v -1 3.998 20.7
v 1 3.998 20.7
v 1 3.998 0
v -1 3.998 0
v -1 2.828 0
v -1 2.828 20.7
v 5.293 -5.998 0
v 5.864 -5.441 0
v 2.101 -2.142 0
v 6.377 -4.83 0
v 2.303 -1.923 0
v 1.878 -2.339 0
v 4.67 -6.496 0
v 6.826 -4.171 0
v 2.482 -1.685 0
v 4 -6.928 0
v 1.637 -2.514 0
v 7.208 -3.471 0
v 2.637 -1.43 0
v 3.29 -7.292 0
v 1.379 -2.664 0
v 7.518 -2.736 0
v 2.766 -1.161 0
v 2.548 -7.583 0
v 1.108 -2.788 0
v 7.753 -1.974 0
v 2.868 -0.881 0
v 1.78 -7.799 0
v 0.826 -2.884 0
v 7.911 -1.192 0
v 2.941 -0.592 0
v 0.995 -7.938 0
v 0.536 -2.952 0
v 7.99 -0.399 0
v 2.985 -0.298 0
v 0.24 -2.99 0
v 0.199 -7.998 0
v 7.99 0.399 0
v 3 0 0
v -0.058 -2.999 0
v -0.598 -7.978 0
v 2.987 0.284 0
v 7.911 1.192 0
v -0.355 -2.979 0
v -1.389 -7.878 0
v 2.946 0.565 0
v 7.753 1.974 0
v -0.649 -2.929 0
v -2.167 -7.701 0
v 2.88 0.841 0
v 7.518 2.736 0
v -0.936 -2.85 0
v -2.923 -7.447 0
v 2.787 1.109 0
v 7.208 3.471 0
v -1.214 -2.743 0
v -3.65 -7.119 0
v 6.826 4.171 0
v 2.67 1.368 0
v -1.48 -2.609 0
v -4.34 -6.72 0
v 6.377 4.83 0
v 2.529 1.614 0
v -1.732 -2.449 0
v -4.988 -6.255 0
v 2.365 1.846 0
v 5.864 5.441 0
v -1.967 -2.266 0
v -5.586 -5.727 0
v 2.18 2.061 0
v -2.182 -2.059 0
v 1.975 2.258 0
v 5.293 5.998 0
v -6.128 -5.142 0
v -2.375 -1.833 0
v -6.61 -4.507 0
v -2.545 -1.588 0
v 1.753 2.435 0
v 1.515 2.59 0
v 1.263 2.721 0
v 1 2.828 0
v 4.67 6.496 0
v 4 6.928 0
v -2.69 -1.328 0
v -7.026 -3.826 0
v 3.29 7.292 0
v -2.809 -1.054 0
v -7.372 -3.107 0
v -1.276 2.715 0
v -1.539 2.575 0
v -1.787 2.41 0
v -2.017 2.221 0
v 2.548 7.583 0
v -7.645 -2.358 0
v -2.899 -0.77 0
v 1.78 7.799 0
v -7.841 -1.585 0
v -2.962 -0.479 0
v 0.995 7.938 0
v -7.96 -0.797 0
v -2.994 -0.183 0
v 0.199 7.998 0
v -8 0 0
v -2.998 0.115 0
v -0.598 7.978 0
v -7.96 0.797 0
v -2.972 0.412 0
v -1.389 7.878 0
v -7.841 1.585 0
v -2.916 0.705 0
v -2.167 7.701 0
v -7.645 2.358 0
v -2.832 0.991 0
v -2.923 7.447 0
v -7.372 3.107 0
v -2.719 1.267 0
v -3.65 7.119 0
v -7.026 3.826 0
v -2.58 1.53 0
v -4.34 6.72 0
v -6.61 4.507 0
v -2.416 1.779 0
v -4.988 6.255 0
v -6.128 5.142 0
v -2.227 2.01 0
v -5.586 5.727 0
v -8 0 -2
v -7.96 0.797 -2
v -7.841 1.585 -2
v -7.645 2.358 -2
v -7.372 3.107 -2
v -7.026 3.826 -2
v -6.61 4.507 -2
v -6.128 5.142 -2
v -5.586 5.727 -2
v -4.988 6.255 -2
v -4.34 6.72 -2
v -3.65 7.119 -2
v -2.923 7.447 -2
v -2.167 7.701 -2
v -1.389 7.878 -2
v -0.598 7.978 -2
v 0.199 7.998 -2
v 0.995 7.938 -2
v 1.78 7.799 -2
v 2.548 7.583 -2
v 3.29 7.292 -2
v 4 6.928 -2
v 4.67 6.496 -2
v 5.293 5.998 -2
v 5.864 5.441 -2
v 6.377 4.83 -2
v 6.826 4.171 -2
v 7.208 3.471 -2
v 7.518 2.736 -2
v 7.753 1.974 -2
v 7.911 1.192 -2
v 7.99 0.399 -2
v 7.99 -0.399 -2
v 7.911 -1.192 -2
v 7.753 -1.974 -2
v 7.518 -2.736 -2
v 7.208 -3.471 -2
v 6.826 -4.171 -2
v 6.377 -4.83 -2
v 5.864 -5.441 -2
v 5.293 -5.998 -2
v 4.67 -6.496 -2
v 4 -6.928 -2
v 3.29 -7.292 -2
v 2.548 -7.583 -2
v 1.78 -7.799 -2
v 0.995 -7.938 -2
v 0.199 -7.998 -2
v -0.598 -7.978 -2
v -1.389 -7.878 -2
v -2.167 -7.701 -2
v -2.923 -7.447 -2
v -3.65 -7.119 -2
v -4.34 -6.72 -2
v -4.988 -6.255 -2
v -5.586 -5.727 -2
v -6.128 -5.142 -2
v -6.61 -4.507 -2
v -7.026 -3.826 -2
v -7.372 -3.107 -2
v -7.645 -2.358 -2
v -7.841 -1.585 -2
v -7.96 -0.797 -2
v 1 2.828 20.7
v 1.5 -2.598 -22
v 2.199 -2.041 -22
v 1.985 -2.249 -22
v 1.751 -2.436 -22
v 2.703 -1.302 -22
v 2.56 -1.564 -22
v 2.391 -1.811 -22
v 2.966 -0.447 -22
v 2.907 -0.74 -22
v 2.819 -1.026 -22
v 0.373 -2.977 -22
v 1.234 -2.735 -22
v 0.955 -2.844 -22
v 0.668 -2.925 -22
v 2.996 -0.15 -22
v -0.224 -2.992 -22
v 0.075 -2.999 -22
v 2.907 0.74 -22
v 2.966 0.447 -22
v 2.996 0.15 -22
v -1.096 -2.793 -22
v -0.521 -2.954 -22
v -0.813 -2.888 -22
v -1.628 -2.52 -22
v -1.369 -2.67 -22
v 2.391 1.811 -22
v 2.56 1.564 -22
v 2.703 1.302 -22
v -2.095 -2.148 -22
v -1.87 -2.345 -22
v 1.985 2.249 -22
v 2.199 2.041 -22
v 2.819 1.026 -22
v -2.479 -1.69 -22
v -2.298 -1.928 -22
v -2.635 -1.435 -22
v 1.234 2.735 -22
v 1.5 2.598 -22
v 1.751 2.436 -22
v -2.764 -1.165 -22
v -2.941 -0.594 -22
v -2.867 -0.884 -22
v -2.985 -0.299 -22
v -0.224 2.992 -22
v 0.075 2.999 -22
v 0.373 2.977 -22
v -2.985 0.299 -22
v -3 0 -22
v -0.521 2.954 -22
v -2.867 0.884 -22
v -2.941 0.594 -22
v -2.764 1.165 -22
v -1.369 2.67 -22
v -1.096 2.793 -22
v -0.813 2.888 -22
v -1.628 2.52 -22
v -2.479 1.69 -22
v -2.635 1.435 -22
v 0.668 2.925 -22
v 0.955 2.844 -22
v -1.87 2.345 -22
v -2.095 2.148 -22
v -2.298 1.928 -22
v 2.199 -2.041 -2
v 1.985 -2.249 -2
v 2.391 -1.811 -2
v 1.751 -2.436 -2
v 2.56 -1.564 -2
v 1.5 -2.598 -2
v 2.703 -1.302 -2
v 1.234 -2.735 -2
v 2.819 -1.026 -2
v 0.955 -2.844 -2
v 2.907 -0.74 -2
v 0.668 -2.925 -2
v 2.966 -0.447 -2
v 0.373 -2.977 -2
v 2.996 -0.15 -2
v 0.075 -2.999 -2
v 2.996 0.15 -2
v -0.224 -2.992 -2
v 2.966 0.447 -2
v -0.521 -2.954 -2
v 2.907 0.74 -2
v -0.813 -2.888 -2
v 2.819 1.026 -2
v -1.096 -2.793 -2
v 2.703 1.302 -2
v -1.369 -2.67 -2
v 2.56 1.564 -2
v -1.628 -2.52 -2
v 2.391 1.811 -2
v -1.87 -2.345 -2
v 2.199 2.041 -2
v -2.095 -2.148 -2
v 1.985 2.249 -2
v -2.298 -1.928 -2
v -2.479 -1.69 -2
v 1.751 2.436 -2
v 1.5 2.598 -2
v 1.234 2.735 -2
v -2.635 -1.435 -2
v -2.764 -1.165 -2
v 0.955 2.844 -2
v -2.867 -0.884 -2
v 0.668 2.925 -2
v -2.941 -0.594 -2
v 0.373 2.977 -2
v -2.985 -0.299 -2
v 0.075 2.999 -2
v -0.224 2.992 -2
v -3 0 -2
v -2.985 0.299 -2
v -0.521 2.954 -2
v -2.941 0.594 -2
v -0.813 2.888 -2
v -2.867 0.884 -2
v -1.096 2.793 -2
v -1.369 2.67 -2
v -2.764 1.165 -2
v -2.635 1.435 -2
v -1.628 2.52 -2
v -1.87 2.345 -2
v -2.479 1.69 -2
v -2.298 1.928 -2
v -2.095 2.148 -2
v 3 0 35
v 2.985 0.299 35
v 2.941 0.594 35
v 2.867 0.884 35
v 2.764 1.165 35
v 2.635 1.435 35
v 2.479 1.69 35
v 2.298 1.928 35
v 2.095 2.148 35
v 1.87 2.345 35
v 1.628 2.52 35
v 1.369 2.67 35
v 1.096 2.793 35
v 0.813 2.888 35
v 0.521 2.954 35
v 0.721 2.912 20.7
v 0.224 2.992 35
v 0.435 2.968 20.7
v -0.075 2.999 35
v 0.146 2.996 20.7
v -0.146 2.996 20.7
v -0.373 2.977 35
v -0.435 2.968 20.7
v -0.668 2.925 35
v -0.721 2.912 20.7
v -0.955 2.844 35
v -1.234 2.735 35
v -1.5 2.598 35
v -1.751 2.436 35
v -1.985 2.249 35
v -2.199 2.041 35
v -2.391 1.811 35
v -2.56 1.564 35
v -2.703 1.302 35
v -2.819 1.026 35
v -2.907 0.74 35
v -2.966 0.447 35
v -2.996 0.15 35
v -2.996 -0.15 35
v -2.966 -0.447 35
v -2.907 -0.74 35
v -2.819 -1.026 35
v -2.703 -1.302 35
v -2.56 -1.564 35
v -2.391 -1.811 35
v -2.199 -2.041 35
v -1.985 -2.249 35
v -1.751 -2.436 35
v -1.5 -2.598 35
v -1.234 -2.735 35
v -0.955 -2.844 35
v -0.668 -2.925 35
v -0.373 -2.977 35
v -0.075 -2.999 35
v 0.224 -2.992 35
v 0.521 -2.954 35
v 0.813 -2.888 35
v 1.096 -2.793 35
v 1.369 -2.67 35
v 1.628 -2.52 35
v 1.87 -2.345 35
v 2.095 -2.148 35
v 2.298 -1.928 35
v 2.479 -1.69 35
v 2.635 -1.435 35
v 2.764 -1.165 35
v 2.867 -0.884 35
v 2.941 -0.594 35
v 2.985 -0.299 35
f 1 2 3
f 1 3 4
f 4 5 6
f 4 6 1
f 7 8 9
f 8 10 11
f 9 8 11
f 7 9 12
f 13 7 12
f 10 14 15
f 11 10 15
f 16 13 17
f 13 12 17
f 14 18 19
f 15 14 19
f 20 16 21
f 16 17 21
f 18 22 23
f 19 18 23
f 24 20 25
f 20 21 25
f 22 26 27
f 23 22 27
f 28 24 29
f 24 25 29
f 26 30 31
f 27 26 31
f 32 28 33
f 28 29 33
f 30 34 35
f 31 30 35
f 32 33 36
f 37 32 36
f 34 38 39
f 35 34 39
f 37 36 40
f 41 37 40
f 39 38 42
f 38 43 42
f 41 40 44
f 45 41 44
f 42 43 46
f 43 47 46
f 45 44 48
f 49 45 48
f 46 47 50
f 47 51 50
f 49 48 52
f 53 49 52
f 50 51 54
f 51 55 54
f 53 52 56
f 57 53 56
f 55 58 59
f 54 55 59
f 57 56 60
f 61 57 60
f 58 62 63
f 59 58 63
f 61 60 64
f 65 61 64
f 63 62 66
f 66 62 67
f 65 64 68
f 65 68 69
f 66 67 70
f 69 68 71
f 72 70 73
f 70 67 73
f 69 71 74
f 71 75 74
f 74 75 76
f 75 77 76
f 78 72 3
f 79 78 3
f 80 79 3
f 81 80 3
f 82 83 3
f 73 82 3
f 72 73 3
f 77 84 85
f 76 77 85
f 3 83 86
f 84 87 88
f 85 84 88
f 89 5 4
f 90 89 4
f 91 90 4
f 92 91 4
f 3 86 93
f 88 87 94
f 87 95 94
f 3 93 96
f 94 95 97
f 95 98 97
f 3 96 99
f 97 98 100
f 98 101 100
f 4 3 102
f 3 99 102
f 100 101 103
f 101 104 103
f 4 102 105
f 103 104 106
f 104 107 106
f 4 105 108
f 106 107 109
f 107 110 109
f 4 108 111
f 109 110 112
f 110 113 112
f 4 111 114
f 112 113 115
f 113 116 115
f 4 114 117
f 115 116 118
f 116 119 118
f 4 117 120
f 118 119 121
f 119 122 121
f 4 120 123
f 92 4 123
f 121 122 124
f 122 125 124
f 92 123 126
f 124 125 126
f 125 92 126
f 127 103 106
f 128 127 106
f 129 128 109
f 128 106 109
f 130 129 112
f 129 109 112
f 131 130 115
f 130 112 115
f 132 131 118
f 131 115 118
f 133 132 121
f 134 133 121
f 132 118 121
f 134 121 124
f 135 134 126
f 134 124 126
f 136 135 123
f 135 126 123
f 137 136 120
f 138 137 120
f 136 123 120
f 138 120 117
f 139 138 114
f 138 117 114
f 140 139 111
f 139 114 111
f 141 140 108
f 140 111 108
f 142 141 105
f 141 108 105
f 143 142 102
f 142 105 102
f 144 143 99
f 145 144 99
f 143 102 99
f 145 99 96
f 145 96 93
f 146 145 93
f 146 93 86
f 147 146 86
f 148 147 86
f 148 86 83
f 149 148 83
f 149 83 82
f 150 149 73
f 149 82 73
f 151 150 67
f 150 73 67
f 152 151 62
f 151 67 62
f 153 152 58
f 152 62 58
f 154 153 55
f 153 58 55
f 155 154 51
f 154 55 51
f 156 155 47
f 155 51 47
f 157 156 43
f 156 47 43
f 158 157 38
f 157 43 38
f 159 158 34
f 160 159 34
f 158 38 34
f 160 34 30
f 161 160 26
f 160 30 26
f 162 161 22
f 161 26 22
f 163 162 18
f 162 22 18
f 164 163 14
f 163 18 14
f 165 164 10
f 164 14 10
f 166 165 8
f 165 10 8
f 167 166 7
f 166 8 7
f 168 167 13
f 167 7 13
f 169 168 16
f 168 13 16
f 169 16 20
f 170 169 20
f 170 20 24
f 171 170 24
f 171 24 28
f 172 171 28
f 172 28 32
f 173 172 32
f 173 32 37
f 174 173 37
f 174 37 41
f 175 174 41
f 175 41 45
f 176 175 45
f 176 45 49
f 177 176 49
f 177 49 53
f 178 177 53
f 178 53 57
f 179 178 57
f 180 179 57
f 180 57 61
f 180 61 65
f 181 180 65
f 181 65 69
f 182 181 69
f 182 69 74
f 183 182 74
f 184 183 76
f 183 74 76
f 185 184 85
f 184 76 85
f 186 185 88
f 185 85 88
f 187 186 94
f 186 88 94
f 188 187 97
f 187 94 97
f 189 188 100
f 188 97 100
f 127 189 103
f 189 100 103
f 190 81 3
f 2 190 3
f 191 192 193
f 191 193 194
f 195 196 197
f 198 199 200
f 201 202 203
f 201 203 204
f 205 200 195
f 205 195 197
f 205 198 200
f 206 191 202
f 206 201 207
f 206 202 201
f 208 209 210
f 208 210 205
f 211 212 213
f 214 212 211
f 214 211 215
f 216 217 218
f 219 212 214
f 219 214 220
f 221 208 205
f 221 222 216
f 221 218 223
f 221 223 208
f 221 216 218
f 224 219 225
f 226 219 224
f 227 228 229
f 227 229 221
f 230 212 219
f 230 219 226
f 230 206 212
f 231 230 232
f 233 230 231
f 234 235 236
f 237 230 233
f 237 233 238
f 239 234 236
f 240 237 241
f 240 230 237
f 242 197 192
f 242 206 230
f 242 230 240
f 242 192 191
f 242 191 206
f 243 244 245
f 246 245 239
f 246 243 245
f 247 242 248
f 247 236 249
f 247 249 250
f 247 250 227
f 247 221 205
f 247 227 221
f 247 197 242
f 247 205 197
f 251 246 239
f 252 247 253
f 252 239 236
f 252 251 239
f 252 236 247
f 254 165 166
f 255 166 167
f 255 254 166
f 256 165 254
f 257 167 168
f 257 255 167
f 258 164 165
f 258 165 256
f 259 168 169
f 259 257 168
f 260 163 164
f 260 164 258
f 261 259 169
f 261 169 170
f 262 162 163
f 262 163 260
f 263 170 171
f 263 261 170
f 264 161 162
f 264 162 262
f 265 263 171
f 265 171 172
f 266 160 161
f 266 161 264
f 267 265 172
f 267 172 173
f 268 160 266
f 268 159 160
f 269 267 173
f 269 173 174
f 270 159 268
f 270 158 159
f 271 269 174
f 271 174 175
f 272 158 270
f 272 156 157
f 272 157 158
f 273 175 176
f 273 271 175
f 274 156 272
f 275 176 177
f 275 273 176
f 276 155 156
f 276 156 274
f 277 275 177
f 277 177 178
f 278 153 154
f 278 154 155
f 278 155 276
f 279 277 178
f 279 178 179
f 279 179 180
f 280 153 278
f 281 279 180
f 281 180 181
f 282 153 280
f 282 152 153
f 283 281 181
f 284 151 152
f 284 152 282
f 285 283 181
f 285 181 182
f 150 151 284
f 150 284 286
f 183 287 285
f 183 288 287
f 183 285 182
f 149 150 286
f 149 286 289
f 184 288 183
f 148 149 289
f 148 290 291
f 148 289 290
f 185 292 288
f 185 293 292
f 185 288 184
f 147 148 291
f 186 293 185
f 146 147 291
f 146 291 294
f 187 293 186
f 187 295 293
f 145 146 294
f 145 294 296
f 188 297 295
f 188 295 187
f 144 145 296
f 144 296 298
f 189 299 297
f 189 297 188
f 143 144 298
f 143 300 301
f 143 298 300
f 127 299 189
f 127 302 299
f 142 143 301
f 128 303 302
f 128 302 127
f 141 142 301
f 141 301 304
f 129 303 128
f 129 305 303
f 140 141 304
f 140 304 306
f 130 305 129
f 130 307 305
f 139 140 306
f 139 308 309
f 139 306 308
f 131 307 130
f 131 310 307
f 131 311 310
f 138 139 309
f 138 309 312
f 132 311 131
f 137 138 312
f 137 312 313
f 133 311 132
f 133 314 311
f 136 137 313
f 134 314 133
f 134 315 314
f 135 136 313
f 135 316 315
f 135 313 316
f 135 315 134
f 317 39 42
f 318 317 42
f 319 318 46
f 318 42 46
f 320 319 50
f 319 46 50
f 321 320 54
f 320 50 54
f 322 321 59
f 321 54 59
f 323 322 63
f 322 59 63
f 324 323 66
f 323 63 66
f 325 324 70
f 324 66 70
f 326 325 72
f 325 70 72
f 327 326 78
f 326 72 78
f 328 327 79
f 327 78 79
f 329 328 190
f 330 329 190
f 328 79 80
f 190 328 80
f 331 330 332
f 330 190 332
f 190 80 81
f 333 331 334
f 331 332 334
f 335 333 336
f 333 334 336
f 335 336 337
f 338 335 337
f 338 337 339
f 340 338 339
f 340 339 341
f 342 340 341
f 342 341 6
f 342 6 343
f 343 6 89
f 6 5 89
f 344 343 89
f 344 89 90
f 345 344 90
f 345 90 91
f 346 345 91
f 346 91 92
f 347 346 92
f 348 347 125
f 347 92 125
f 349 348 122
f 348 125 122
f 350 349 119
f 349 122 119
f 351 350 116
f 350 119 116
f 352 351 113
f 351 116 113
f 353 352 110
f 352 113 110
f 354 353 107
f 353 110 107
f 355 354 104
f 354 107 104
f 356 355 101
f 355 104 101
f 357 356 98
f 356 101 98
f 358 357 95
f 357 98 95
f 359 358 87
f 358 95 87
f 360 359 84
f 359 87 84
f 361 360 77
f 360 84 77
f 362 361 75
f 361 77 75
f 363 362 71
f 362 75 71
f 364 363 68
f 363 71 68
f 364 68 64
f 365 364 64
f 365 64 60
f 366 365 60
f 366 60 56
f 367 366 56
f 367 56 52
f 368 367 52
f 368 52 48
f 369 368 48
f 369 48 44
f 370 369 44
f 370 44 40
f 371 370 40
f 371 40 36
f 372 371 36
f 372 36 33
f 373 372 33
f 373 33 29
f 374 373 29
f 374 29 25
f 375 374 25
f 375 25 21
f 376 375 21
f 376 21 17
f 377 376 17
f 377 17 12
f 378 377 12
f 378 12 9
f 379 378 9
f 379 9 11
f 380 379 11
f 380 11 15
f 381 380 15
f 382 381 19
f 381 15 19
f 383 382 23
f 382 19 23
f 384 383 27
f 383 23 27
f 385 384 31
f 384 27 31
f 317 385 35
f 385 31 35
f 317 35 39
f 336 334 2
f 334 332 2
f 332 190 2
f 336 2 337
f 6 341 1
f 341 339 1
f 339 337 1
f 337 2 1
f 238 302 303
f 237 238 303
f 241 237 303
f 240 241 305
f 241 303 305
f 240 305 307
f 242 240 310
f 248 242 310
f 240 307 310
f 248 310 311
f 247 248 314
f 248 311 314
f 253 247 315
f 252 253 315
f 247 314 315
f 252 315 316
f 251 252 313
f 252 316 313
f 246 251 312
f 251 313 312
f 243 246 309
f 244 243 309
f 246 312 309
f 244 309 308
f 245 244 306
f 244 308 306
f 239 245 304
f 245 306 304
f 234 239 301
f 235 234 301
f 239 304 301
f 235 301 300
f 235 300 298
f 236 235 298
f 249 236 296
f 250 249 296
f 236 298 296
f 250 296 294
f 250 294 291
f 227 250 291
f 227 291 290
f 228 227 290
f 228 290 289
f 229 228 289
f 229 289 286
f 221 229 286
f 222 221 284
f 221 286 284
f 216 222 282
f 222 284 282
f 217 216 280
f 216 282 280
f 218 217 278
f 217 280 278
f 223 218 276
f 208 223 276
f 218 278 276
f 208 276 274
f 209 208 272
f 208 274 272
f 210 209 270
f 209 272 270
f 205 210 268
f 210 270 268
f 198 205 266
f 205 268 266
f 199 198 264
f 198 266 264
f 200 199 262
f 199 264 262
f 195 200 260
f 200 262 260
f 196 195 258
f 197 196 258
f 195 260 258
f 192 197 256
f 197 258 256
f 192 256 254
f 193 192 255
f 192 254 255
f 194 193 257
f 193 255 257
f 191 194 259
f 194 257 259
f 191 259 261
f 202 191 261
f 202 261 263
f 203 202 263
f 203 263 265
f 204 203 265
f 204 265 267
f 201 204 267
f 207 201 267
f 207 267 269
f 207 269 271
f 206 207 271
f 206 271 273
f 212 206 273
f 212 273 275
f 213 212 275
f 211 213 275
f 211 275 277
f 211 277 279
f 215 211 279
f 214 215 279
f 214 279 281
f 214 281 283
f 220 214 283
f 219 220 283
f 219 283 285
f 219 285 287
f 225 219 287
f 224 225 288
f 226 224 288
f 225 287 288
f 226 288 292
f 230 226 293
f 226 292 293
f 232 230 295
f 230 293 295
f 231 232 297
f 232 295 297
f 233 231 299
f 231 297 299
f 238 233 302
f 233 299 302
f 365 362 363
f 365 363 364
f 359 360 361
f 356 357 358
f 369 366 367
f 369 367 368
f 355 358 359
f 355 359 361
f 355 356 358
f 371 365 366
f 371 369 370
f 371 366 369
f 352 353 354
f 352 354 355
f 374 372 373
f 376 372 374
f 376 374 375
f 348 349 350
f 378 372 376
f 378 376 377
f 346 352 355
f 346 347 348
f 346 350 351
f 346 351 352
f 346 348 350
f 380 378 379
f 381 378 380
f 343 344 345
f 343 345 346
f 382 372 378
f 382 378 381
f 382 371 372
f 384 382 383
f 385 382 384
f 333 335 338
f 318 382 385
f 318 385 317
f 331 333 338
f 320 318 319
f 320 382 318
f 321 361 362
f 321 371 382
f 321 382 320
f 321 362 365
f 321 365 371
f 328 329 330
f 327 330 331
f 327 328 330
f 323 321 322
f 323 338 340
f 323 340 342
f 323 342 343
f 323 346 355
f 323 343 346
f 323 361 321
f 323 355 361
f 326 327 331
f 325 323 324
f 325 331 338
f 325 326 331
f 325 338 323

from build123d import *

# Parameters (mm, degrees)
SKETCH1_R           = 3
BOSS_EXTRUDE1_DEPTH = 35
SKETCH3_R           = 8
BOSS_EXTRUDE3_DEPTH = 2
SKETCH2_W           = 2
SKETCH2_H           = 1.17
BOSS_EXTRUDE4_DEPTH = 20.7
SKETCH4_R           = 3
BOSS_EXTRUDE5_DEPTH = 20


with BuildPart() as part:
    # Sketch1 → Boss-Extrude1 (new body)
    with BuildSketch(Plane.XY):
        Circle(SKETCH1_R)
    extrude(amount=BOSS_EXTRUDE1_DEPTH)

    # Sketch3 → Boss-Extrude3 (add)
    with BuildSketch(Plane(origin=(0, 0, 0), x_dir=(-1, 0, 0), z_dir=(0, 0, -1))):
        Circle(SKETCH3_R)
    extrude(amount=BOSS_EXTRUDE3_DEPTH)

    # Sketch2 → Boss-Extrude4 (add)
    with BuildSketch(Plane(origin=(0, 0, 0), x_dir=(-1, 0, 0), z_dir=(0, 0, -1))):
        with Locations((0, 3.413427125)):
            Rectangle(SKETCH2_W, SKETCH2_H)
    extrude(amount=-BOSS_EXTRUDE4_DEPTH)

    # Sketch4 → Boss-Extrude5 (add)
    with BuildSketch(Plane(origin=(0, 0, -2), x_dir=(-1, 0, 0), z_dir=(0, 0, -1))):
        Circle(SKETCH4_R)
    extrude(amount=BOSS_EXTRUDE5_DEPTH)


solid = part.part
